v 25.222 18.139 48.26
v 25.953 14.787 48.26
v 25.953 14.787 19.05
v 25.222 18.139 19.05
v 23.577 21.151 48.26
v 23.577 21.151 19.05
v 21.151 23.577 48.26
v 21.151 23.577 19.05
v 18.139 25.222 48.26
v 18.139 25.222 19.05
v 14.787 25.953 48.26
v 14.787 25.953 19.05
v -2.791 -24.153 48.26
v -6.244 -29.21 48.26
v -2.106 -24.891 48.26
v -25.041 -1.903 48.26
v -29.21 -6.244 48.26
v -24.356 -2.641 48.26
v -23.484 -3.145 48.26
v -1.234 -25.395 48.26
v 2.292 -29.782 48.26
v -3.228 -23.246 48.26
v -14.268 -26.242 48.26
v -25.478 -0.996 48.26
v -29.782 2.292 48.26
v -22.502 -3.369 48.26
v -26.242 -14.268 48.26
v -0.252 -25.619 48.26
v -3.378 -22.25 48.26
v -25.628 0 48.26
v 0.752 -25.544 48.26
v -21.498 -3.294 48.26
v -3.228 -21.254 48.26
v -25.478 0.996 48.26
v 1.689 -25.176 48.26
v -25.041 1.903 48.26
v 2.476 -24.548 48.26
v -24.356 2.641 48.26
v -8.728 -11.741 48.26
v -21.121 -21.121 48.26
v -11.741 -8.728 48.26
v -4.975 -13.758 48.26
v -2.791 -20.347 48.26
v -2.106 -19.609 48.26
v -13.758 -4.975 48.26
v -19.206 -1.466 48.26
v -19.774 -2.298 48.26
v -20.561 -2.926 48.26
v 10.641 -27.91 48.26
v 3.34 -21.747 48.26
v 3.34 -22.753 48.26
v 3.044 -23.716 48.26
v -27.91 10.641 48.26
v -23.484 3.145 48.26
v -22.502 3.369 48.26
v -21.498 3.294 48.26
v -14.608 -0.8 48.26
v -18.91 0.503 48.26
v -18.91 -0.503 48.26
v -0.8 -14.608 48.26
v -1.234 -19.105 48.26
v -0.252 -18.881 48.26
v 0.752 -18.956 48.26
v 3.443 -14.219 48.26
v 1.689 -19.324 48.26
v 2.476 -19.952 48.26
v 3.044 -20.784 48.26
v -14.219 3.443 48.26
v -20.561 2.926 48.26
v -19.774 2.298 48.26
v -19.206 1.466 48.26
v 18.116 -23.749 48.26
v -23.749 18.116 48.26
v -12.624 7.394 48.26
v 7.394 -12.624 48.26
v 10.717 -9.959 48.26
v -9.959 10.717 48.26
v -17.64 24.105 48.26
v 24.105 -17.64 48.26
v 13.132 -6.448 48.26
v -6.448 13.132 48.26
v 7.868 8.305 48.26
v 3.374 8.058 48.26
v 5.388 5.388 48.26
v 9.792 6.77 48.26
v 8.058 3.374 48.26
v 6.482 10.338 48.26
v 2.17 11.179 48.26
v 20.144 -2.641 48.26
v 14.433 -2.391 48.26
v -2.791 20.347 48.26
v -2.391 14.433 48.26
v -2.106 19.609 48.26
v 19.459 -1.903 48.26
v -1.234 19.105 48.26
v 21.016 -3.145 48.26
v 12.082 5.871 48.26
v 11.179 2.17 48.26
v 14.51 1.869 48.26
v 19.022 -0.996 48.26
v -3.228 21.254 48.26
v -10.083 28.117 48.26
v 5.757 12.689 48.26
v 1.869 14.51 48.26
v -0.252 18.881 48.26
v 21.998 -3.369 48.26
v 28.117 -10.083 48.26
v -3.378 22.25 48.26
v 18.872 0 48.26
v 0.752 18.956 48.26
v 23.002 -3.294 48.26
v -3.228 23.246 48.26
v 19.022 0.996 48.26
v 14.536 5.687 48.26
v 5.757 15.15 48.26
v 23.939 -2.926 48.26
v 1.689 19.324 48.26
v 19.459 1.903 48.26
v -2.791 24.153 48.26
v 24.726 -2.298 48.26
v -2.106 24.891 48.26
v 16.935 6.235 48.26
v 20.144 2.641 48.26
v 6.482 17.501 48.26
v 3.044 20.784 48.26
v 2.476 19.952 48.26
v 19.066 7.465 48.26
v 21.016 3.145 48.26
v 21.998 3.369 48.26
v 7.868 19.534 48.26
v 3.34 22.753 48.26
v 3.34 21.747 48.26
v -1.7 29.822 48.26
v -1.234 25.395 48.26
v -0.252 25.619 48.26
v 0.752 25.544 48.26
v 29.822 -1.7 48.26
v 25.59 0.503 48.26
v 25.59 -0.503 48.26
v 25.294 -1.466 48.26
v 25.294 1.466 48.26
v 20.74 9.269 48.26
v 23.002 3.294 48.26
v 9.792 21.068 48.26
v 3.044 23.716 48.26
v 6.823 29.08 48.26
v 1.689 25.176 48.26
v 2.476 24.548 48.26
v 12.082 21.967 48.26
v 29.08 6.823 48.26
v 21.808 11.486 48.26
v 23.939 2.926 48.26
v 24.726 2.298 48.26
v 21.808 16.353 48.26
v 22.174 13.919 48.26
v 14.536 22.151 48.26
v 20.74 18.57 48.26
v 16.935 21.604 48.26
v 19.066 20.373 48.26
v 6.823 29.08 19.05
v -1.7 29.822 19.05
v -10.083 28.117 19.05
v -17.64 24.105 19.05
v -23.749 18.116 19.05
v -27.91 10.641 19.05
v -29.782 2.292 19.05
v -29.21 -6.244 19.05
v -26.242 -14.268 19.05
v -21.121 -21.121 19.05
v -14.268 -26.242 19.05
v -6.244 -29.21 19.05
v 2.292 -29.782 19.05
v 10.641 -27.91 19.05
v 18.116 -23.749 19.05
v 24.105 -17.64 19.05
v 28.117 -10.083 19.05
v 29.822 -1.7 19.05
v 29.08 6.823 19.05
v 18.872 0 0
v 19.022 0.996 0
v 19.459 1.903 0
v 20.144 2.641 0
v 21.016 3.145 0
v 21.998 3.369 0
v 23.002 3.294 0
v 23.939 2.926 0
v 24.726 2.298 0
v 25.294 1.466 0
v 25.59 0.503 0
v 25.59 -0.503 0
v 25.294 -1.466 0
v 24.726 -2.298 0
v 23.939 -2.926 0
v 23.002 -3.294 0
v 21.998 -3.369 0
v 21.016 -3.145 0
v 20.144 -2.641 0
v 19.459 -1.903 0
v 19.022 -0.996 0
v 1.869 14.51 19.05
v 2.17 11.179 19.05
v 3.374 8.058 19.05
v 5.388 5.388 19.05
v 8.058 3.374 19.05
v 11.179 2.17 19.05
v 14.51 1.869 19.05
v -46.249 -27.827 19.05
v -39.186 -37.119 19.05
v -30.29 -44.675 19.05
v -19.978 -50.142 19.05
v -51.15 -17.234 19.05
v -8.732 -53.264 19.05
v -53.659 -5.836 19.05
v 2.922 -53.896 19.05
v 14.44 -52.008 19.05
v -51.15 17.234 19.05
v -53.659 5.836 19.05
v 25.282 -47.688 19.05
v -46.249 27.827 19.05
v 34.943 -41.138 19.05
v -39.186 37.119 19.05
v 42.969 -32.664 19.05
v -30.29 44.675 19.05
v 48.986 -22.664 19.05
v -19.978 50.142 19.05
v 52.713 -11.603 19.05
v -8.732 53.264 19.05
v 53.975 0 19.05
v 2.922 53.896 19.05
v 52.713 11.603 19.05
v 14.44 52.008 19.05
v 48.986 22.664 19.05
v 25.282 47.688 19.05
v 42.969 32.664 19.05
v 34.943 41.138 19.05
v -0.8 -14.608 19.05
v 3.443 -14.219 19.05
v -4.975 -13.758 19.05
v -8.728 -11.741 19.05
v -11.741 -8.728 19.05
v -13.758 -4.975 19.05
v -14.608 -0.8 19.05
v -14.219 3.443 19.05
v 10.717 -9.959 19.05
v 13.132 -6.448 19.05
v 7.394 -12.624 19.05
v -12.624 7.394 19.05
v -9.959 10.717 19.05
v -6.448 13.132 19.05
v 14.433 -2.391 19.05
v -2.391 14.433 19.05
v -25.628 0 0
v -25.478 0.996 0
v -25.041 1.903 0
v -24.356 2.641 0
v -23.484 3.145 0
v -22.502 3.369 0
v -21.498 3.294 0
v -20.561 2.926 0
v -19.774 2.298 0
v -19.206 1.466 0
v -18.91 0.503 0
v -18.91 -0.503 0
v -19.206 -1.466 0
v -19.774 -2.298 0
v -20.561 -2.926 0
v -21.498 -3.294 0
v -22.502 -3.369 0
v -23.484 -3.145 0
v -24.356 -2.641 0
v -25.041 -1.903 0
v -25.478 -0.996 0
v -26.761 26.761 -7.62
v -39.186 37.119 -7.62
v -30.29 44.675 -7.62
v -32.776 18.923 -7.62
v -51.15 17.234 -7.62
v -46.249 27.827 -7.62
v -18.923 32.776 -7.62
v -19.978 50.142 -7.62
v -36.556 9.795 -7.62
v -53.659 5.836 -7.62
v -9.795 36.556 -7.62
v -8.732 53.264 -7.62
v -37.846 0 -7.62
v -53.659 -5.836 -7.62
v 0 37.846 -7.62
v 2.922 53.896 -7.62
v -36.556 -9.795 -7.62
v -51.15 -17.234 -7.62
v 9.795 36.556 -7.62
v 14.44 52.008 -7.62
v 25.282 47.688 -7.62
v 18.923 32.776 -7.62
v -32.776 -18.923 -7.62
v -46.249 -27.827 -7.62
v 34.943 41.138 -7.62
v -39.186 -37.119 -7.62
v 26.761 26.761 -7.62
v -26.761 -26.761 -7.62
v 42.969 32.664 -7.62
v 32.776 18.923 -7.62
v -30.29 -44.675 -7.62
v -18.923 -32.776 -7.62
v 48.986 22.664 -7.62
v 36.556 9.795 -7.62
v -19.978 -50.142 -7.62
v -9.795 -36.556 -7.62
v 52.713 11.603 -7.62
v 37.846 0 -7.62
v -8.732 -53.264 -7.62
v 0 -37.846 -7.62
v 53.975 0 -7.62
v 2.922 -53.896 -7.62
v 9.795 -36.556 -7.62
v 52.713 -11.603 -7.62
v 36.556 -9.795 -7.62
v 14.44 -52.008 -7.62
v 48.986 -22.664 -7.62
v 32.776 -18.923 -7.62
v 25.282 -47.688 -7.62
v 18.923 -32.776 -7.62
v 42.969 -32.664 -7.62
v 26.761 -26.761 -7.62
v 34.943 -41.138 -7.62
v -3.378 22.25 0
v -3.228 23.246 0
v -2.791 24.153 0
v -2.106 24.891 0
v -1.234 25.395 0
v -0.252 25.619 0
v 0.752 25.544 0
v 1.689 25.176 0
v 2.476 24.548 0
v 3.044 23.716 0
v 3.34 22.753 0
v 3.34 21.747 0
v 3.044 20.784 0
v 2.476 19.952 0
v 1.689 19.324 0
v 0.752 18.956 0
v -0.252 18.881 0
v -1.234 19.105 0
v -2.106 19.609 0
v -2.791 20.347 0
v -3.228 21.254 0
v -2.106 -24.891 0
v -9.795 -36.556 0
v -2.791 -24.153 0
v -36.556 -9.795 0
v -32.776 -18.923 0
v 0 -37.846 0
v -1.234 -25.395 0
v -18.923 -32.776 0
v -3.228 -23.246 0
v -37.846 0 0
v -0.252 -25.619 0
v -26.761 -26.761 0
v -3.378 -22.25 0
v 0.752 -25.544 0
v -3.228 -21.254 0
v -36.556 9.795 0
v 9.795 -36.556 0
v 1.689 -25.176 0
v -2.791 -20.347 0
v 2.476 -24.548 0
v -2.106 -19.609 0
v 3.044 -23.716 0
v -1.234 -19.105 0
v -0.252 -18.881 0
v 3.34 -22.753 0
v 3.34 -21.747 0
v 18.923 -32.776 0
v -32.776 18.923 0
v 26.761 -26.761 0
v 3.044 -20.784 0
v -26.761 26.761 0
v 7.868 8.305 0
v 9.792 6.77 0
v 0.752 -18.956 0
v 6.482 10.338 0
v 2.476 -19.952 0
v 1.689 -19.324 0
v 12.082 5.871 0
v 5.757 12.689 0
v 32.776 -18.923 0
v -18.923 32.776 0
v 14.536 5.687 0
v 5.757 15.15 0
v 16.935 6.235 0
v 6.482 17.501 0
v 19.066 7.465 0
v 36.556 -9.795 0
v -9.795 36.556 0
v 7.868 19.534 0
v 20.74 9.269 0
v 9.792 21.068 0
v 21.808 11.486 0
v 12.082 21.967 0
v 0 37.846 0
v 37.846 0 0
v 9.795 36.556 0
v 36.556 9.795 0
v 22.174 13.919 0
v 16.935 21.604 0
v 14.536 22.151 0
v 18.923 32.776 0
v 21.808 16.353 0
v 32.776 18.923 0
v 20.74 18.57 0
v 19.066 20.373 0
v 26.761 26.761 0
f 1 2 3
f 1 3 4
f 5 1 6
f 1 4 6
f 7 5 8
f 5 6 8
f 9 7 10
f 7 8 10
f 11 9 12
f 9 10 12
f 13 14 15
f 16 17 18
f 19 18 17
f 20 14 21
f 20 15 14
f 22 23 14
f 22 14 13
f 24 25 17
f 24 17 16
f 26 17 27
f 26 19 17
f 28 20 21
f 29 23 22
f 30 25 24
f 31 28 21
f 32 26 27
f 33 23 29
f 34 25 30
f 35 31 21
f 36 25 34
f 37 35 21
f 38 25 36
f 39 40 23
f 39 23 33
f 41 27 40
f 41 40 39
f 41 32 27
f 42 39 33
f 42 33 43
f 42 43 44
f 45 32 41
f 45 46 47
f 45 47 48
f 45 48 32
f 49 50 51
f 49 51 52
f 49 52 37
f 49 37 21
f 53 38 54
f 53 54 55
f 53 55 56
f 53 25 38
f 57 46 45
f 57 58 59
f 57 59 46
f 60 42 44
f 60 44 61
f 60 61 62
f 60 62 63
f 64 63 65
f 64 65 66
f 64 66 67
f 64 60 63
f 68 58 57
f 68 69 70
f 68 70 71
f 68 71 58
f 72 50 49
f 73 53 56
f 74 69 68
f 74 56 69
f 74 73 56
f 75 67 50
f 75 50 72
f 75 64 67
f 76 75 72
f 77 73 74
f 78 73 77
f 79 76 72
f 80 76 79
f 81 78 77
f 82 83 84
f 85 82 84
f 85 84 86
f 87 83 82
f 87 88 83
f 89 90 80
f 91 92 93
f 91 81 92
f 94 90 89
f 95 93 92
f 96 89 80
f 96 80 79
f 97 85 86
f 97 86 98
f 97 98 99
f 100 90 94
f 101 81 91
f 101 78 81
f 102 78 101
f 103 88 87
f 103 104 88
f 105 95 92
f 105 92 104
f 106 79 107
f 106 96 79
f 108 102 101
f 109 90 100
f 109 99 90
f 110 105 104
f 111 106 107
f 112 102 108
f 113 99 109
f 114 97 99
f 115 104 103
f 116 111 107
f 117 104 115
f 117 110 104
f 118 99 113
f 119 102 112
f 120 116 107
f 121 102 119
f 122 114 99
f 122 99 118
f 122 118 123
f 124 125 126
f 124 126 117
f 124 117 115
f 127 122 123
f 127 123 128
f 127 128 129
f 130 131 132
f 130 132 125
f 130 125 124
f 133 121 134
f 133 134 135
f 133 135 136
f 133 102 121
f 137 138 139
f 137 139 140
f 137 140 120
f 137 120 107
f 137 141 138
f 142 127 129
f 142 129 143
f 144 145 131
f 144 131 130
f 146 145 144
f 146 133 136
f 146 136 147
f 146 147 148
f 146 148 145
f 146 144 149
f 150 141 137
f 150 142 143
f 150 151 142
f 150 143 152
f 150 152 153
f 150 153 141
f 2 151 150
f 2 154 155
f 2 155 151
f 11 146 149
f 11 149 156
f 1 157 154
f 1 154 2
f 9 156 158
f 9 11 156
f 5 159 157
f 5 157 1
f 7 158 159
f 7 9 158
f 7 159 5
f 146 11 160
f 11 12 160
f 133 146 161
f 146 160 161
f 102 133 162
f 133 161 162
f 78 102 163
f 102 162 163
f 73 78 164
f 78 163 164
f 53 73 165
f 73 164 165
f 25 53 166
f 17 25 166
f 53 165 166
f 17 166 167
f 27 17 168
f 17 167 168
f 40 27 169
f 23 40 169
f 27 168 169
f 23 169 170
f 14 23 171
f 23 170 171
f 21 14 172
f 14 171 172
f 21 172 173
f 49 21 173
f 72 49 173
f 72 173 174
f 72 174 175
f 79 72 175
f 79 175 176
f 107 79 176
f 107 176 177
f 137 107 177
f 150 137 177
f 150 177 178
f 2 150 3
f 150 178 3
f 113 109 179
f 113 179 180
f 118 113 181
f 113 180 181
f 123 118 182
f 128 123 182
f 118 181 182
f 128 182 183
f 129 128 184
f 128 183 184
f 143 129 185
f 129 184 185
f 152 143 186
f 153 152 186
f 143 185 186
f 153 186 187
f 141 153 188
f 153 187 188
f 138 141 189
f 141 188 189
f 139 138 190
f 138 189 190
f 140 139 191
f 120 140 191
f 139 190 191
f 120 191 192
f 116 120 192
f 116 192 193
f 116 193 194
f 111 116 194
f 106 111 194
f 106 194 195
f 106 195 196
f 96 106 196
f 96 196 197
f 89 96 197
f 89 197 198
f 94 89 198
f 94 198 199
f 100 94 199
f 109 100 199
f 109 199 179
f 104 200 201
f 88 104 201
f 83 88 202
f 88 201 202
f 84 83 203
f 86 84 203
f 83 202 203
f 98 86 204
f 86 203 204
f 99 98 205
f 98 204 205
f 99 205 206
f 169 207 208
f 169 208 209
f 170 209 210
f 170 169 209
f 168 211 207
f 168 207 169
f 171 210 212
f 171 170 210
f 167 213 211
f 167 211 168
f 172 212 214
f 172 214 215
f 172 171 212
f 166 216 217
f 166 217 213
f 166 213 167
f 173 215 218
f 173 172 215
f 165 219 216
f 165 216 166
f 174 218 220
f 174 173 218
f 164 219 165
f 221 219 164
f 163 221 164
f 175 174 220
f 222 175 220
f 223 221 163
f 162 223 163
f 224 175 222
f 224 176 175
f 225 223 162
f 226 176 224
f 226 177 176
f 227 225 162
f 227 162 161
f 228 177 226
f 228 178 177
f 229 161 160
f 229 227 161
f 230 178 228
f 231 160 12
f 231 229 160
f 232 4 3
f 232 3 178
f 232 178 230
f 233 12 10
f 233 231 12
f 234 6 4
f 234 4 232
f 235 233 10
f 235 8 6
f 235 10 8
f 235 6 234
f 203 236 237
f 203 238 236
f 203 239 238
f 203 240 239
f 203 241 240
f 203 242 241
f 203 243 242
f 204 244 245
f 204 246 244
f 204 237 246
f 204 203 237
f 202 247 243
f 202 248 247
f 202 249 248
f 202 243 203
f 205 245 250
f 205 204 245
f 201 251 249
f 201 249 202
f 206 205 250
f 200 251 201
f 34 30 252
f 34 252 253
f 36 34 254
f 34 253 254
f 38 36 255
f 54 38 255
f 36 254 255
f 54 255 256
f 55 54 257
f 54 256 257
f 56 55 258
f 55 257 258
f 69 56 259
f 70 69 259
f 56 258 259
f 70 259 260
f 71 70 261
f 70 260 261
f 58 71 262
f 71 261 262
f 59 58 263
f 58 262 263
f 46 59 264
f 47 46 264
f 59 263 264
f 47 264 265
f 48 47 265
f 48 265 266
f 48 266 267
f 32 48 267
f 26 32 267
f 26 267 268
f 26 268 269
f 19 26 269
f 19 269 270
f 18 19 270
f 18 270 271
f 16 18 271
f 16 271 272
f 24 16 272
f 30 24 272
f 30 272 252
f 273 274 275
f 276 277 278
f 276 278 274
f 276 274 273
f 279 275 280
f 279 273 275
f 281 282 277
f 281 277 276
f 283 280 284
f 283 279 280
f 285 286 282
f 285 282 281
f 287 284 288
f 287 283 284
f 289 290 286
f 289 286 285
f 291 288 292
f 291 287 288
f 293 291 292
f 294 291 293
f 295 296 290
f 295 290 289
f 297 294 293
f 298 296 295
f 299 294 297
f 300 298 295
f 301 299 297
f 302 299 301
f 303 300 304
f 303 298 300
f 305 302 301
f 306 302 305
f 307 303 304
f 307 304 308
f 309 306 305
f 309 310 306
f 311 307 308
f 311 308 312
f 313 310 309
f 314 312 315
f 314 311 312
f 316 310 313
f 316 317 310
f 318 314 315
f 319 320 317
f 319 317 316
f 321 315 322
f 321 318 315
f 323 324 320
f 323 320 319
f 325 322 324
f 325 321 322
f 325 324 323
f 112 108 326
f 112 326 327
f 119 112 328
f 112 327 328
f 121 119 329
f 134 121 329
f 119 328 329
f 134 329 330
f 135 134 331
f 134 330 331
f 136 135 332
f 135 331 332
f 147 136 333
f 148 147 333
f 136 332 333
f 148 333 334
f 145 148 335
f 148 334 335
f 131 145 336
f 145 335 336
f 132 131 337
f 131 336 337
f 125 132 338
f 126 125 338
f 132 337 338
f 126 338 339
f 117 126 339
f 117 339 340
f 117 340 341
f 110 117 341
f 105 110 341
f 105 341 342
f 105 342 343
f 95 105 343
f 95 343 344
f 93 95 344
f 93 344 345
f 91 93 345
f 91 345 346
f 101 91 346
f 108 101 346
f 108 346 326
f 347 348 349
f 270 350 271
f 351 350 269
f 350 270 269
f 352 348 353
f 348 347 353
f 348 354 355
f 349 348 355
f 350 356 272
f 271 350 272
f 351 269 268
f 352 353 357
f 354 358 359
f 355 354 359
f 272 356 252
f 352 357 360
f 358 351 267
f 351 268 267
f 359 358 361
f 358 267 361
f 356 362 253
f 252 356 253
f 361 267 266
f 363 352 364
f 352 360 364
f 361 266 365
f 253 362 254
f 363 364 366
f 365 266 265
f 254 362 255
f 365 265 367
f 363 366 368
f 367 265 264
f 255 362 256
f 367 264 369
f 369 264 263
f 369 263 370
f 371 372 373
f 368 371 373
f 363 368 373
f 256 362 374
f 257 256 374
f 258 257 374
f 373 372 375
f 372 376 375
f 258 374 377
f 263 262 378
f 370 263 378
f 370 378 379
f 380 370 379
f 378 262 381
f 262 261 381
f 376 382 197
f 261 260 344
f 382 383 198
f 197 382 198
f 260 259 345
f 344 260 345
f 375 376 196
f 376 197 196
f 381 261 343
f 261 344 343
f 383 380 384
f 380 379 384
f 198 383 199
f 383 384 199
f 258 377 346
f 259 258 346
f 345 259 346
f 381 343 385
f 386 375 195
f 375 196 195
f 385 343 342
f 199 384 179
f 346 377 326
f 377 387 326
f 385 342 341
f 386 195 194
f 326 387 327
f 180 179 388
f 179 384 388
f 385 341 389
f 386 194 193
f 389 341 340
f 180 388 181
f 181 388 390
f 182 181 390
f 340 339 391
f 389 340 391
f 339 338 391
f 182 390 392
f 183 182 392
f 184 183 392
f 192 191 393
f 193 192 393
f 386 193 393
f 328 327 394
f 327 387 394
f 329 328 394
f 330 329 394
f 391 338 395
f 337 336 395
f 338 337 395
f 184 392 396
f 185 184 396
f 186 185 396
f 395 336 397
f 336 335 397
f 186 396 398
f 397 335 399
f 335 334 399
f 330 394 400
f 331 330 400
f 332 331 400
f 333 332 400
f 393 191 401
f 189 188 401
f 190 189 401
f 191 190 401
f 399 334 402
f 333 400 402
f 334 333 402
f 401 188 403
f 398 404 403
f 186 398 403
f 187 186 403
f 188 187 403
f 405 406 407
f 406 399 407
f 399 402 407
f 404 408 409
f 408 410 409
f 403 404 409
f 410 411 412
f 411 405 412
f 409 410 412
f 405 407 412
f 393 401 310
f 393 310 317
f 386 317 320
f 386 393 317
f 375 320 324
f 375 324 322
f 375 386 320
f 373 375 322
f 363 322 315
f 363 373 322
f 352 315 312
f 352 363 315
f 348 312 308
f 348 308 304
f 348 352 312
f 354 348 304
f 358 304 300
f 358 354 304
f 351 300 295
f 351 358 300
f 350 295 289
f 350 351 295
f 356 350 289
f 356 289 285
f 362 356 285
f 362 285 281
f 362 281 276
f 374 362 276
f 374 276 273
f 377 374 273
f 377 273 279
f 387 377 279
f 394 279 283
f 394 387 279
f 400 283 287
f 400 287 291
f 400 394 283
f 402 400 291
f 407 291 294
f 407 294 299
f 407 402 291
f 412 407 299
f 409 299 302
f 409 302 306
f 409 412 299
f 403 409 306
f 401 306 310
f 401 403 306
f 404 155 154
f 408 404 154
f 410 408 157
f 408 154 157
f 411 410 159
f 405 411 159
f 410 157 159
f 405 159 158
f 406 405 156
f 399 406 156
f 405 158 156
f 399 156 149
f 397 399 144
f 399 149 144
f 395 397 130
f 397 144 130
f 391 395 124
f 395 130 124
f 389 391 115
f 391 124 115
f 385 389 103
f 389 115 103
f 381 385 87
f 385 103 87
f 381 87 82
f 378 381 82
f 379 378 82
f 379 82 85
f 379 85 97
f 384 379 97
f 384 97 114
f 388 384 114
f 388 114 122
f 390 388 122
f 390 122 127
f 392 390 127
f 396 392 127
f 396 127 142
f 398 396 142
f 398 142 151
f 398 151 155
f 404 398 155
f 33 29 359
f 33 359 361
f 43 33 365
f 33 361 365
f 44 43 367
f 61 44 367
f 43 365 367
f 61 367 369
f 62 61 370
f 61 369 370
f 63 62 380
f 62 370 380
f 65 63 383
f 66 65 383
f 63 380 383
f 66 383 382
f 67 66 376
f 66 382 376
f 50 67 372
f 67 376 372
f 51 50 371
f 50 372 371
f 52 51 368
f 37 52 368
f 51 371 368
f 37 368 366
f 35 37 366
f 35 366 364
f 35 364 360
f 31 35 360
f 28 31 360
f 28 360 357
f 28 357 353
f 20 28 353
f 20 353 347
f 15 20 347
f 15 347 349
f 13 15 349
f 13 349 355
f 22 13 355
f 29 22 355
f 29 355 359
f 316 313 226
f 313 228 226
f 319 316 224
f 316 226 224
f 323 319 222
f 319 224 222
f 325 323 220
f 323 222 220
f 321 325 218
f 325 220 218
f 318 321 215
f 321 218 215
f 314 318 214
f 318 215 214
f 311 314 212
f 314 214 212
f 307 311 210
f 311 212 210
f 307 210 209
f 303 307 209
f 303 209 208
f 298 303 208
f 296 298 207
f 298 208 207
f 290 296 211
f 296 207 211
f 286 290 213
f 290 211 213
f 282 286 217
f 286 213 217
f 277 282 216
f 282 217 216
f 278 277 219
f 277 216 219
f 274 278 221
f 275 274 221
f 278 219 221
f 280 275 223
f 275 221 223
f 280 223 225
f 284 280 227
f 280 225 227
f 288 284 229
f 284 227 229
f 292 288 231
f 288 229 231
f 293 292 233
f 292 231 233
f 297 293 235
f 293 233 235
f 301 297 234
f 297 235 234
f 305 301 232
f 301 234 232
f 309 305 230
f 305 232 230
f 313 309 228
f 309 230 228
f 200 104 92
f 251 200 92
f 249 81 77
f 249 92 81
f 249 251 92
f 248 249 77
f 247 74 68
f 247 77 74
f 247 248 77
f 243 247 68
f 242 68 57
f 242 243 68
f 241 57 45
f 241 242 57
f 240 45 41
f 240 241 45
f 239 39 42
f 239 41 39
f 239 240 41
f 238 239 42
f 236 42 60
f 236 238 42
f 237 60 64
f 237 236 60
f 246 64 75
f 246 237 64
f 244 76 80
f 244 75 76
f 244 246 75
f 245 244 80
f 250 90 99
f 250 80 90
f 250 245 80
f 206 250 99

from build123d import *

# Parameters (mm, degrees)
F0_R      = 53.975
F1_DEPTH  = 19.05
F2_R      = 29.87
F2_R_2    = 14.63
F3_DEPTH  = 29.21
F5_D      = 6.7564
F6_R      = 53.975
F6_R_2    = 37.846
F7_DEPTH  = 7.62
F8_R      = 12.065
F9_DEPTH  = 29.21
F10_R     = 8.255
F11_DEPTH = 55.881


with BuildPart() as f1:
    # F0 (on Top) → F1 (new body)
    with BuildSketch(Plane.XY):
        Circle(F0_R)
    extrude(amount=F1_DEPTH)

    # F2 (on face) → F3 (join)
    with BuildSketch(Plane.XY.offset(19.05)):
        Circle(F2_R)
        Circle(F2_R_2, mode=Mode.SUBTRACT)
    extrude(amount=F3_DEPTH)

    # F5 (through all)
    with Locations(Plane.XY.offset(48.26)):
        with Locations((0, -22.25), (-22.25, 0), (0, 22.25), (22.25, 0)):
            Hole(F5_D / 2)

    # F6 (on face) → F7 (join)
    with BuildSketch(Plane(origin=(0, 0, 0), x_dir=(1, 0, 0), z_dir=(0, 0, -1))):
        Circle(F6_R)
        Circle(F6_R_2, mode=Mode.SUBTRACT)
    extrude(amount=F7_DEPTH)

    # F8 (on face) → F9 (join, through all)
    with BuildSketch(Plane.XY.offset(19.05)):
        with Locations((13.9193969877, 13.9193969877)):
            Circle(F8_R)
    extrude(amount=F9_DEPTH)

    # F10 (on face) → F11 (cut, through all)
    with BuildSketch(Plane.XY.offset(48.26)):
        with Locations((13.9193969877, 13.9193969877)):
            Circle(F10_R)
    extrude(amount=-F11_DEPTH, mode=Mode.SUBTRACT)


solid = f1.part
